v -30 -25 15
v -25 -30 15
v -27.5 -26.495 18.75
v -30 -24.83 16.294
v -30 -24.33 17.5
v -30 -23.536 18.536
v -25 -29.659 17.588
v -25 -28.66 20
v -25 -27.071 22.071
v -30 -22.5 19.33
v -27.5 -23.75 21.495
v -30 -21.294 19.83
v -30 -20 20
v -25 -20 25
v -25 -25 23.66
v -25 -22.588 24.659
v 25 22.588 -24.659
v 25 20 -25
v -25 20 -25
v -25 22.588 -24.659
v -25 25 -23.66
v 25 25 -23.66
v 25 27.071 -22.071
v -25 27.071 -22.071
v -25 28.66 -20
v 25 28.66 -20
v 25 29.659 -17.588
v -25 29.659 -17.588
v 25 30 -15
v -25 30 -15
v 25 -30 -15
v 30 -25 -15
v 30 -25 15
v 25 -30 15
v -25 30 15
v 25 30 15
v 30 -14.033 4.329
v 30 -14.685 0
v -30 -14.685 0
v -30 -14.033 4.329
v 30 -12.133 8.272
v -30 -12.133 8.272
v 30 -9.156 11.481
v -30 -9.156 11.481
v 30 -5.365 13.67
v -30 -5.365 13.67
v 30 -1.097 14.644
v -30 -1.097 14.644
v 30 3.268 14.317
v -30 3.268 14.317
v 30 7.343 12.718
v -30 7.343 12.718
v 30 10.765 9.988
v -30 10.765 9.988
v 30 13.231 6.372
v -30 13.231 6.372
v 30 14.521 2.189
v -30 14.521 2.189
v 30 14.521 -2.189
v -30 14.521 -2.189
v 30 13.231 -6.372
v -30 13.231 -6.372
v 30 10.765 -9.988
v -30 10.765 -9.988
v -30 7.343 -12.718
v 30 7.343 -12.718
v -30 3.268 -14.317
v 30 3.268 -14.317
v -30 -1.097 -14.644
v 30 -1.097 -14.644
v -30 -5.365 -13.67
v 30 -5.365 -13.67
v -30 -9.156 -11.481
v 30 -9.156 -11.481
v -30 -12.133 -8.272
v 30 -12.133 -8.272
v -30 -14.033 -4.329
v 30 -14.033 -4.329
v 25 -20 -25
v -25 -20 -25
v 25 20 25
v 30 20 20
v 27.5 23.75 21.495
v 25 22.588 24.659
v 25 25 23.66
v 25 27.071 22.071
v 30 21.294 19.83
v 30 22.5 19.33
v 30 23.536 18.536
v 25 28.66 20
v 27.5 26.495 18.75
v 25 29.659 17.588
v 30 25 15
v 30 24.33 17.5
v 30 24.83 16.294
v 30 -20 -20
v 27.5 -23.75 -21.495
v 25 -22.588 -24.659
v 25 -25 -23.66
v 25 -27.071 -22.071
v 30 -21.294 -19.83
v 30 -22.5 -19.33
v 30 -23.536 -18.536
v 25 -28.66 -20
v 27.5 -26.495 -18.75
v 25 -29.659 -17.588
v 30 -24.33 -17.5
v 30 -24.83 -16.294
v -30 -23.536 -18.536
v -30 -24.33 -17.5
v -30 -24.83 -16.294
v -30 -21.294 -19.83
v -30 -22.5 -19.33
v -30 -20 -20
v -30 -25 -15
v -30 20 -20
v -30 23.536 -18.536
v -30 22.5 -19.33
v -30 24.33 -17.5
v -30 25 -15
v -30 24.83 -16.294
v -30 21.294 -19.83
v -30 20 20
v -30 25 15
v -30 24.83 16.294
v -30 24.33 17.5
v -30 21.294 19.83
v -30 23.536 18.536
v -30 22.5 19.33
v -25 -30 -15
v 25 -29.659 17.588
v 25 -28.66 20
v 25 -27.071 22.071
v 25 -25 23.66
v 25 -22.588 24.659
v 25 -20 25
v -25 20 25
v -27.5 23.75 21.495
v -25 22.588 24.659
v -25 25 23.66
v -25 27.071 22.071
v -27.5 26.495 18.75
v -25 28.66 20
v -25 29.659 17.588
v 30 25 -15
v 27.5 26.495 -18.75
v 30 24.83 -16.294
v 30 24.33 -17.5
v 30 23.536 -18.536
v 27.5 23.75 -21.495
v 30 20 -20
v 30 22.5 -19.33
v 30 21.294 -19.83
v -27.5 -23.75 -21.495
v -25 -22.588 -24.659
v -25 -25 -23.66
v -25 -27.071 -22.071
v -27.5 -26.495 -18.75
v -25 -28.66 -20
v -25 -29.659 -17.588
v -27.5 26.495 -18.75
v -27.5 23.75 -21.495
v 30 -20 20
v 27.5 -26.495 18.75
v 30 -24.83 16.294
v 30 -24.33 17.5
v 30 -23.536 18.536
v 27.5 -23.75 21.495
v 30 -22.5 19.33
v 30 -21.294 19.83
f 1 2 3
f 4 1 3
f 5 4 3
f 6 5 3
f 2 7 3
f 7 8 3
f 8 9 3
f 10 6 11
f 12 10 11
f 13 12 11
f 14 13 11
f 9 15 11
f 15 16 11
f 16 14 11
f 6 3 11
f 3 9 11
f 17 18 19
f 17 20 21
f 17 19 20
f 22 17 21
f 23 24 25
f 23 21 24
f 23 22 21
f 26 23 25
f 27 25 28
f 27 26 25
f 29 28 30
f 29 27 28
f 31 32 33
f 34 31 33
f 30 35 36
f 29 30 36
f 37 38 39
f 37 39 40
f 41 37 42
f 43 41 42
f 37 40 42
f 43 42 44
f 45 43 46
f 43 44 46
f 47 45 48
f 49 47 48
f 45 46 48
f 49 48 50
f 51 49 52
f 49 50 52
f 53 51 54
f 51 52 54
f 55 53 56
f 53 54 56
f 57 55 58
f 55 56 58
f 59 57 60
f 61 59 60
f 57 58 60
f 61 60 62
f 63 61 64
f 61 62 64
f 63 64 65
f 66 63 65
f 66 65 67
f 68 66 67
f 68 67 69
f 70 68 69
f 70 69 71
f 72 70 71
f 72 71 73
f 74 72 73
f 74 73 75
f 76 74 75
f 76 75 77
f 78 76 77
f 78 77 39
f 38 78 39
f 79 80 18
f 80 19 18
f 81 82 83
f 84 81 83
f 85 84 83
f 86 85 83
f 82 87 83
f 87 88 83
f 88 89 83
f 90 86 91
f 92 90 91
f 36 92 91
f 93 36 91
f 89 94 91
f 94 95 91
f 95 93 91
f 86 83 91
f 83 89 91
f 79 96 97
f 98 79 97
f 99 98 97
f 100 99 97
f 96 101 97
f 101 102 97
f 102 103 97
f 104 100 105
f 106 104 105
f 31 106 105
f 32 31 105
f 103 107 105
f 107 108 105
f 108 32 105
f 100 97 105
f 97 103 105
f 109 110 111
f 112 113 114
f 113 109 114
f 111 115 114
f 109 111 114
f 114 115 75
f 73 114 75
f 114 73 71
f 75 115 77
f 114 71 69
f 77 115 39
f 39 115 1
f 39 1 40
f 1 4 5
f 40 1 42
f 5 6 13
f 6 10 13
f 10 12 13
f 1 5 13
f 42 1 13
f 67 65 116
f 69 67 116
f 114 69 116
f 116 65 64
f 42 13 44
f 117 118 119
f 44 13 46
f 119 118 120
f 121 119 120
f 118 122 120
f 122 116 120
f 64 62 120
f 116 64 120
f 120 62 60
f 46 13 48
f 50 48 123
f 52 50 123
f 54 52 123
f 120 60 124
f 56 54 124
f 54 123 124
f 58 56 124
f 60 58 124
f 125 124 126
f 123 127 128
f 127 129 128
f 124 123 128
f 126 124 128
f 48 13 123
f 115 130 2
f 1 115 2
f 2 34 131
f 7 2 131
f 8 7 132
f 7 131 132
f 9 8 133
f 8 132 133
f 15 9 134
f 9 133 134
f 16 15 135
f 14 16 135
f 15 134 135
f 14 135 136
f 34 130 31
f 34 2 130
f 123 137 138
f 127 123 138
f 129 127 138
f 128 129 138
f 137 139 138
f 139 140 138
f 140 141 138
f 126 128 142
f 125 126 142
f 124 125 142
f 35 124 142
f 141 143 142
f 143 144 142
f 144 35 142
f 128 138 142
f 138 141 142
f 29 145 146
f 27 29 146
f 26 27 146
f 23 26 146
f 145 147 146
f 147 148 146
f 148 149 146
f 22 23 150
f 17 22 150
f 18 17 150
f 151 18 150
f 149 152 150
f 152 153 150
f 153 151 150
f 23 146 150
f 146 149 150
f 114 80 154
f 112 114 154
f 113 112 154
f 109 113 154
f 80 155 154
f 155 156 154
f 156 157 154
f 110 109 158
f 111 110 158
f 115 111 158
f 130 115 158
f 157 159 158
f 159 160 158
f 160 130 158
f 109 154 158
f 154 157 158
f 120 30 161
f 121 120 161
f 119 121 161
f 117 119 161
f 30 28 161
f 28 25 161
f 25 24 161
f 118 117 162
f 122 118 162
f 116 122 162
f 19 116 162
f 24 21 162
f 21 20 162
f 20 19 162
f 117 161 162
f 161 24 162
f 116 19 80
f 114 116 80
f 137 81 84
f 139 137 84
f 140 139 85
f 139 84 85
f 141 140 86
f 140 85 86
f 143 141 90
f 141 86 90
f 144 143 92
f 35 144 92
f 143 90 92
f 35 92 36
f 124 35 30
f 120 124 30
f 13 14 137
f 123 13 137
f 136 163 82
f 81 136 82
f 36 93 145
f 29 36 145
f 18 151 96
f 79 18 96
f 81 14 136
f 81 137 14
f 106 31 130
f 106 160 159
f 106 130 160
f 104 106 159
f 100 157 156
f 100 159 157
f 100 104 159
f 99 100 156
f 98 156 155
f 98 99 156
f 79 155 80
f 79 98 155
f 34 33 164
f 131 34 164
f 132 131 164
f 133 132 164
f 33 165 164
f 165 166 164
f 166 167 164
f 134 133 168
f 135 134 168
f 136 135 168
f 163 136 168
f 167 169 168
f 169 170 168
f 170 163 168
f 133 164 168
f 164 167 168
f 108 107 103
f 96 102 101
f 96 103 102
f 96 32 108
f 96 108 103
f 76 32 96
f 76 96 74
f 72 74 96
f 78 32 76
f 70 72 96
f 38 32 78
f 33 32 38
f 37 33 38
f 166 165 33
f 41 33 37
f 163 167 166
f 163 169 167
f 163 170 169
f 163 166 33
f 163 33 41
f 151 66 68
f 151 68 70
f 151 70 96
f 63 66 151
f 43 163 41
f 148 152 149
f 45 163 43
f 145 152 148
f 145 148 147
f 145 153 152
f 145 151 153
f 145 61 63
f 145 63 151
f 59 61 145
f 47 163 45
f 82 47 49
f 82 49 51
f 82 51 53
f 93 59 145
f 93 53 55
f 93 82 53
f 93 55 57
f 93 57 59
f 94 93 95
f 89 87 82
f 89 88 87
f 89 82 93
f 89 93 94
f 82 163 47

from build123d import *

# Parameters (mm, degrees)
F0_W          = 60
F0_H          = 60
F1_DEPTH      = 25
F1_DEPTH_BACK = 25
F3_R          = 14.685213
F4_DEPTH      = 60.001
F5_R          = 10
F6_SIZE2      = 5
F6_SIZE       = 5


with BuildPart() as f1:
    # F0 (on Top) → F1 (new body, two sides)
    with BuildSketch(Plane.XY) as f1_sk:
        Rectangle(F0_W, F0_H)
    extrude(amount=F1_DEPTH)
    extrude(f1_sk.sketch, amount=-F1_DEPTH_BACK)

    # F3 (on offset) → F4 (cut, through all)
    with BuildSketch(Plane(origin=(-30, 0, 0), x_dir=(0, -1, 0), z_dir=(-1, 0, 0))):
        Circle(F3_R)
    extrude(amount=-F4_DEPTH, mode=Mode.SUBTRACT)

    # F5
    f5_edges = [f1.edges().sort_by_distance(p)[0] for p in [
        (0, 30, -25),
        (0, 30, 25),
        (0, -30, 25),
        (0, -30, -25),
    ]]
    fillet(f5_edges, radius=F5_R)

    # F6
    f6_edges = [f1.edges().sort_by_distance(p)[0] for p in [
        (30, 30, 0),
        (-30, 30, 0),
    ]]
    chamfer(f6_edges, length=F6_SIZE, length2=F6_SIZE2)


solid = f1.part
